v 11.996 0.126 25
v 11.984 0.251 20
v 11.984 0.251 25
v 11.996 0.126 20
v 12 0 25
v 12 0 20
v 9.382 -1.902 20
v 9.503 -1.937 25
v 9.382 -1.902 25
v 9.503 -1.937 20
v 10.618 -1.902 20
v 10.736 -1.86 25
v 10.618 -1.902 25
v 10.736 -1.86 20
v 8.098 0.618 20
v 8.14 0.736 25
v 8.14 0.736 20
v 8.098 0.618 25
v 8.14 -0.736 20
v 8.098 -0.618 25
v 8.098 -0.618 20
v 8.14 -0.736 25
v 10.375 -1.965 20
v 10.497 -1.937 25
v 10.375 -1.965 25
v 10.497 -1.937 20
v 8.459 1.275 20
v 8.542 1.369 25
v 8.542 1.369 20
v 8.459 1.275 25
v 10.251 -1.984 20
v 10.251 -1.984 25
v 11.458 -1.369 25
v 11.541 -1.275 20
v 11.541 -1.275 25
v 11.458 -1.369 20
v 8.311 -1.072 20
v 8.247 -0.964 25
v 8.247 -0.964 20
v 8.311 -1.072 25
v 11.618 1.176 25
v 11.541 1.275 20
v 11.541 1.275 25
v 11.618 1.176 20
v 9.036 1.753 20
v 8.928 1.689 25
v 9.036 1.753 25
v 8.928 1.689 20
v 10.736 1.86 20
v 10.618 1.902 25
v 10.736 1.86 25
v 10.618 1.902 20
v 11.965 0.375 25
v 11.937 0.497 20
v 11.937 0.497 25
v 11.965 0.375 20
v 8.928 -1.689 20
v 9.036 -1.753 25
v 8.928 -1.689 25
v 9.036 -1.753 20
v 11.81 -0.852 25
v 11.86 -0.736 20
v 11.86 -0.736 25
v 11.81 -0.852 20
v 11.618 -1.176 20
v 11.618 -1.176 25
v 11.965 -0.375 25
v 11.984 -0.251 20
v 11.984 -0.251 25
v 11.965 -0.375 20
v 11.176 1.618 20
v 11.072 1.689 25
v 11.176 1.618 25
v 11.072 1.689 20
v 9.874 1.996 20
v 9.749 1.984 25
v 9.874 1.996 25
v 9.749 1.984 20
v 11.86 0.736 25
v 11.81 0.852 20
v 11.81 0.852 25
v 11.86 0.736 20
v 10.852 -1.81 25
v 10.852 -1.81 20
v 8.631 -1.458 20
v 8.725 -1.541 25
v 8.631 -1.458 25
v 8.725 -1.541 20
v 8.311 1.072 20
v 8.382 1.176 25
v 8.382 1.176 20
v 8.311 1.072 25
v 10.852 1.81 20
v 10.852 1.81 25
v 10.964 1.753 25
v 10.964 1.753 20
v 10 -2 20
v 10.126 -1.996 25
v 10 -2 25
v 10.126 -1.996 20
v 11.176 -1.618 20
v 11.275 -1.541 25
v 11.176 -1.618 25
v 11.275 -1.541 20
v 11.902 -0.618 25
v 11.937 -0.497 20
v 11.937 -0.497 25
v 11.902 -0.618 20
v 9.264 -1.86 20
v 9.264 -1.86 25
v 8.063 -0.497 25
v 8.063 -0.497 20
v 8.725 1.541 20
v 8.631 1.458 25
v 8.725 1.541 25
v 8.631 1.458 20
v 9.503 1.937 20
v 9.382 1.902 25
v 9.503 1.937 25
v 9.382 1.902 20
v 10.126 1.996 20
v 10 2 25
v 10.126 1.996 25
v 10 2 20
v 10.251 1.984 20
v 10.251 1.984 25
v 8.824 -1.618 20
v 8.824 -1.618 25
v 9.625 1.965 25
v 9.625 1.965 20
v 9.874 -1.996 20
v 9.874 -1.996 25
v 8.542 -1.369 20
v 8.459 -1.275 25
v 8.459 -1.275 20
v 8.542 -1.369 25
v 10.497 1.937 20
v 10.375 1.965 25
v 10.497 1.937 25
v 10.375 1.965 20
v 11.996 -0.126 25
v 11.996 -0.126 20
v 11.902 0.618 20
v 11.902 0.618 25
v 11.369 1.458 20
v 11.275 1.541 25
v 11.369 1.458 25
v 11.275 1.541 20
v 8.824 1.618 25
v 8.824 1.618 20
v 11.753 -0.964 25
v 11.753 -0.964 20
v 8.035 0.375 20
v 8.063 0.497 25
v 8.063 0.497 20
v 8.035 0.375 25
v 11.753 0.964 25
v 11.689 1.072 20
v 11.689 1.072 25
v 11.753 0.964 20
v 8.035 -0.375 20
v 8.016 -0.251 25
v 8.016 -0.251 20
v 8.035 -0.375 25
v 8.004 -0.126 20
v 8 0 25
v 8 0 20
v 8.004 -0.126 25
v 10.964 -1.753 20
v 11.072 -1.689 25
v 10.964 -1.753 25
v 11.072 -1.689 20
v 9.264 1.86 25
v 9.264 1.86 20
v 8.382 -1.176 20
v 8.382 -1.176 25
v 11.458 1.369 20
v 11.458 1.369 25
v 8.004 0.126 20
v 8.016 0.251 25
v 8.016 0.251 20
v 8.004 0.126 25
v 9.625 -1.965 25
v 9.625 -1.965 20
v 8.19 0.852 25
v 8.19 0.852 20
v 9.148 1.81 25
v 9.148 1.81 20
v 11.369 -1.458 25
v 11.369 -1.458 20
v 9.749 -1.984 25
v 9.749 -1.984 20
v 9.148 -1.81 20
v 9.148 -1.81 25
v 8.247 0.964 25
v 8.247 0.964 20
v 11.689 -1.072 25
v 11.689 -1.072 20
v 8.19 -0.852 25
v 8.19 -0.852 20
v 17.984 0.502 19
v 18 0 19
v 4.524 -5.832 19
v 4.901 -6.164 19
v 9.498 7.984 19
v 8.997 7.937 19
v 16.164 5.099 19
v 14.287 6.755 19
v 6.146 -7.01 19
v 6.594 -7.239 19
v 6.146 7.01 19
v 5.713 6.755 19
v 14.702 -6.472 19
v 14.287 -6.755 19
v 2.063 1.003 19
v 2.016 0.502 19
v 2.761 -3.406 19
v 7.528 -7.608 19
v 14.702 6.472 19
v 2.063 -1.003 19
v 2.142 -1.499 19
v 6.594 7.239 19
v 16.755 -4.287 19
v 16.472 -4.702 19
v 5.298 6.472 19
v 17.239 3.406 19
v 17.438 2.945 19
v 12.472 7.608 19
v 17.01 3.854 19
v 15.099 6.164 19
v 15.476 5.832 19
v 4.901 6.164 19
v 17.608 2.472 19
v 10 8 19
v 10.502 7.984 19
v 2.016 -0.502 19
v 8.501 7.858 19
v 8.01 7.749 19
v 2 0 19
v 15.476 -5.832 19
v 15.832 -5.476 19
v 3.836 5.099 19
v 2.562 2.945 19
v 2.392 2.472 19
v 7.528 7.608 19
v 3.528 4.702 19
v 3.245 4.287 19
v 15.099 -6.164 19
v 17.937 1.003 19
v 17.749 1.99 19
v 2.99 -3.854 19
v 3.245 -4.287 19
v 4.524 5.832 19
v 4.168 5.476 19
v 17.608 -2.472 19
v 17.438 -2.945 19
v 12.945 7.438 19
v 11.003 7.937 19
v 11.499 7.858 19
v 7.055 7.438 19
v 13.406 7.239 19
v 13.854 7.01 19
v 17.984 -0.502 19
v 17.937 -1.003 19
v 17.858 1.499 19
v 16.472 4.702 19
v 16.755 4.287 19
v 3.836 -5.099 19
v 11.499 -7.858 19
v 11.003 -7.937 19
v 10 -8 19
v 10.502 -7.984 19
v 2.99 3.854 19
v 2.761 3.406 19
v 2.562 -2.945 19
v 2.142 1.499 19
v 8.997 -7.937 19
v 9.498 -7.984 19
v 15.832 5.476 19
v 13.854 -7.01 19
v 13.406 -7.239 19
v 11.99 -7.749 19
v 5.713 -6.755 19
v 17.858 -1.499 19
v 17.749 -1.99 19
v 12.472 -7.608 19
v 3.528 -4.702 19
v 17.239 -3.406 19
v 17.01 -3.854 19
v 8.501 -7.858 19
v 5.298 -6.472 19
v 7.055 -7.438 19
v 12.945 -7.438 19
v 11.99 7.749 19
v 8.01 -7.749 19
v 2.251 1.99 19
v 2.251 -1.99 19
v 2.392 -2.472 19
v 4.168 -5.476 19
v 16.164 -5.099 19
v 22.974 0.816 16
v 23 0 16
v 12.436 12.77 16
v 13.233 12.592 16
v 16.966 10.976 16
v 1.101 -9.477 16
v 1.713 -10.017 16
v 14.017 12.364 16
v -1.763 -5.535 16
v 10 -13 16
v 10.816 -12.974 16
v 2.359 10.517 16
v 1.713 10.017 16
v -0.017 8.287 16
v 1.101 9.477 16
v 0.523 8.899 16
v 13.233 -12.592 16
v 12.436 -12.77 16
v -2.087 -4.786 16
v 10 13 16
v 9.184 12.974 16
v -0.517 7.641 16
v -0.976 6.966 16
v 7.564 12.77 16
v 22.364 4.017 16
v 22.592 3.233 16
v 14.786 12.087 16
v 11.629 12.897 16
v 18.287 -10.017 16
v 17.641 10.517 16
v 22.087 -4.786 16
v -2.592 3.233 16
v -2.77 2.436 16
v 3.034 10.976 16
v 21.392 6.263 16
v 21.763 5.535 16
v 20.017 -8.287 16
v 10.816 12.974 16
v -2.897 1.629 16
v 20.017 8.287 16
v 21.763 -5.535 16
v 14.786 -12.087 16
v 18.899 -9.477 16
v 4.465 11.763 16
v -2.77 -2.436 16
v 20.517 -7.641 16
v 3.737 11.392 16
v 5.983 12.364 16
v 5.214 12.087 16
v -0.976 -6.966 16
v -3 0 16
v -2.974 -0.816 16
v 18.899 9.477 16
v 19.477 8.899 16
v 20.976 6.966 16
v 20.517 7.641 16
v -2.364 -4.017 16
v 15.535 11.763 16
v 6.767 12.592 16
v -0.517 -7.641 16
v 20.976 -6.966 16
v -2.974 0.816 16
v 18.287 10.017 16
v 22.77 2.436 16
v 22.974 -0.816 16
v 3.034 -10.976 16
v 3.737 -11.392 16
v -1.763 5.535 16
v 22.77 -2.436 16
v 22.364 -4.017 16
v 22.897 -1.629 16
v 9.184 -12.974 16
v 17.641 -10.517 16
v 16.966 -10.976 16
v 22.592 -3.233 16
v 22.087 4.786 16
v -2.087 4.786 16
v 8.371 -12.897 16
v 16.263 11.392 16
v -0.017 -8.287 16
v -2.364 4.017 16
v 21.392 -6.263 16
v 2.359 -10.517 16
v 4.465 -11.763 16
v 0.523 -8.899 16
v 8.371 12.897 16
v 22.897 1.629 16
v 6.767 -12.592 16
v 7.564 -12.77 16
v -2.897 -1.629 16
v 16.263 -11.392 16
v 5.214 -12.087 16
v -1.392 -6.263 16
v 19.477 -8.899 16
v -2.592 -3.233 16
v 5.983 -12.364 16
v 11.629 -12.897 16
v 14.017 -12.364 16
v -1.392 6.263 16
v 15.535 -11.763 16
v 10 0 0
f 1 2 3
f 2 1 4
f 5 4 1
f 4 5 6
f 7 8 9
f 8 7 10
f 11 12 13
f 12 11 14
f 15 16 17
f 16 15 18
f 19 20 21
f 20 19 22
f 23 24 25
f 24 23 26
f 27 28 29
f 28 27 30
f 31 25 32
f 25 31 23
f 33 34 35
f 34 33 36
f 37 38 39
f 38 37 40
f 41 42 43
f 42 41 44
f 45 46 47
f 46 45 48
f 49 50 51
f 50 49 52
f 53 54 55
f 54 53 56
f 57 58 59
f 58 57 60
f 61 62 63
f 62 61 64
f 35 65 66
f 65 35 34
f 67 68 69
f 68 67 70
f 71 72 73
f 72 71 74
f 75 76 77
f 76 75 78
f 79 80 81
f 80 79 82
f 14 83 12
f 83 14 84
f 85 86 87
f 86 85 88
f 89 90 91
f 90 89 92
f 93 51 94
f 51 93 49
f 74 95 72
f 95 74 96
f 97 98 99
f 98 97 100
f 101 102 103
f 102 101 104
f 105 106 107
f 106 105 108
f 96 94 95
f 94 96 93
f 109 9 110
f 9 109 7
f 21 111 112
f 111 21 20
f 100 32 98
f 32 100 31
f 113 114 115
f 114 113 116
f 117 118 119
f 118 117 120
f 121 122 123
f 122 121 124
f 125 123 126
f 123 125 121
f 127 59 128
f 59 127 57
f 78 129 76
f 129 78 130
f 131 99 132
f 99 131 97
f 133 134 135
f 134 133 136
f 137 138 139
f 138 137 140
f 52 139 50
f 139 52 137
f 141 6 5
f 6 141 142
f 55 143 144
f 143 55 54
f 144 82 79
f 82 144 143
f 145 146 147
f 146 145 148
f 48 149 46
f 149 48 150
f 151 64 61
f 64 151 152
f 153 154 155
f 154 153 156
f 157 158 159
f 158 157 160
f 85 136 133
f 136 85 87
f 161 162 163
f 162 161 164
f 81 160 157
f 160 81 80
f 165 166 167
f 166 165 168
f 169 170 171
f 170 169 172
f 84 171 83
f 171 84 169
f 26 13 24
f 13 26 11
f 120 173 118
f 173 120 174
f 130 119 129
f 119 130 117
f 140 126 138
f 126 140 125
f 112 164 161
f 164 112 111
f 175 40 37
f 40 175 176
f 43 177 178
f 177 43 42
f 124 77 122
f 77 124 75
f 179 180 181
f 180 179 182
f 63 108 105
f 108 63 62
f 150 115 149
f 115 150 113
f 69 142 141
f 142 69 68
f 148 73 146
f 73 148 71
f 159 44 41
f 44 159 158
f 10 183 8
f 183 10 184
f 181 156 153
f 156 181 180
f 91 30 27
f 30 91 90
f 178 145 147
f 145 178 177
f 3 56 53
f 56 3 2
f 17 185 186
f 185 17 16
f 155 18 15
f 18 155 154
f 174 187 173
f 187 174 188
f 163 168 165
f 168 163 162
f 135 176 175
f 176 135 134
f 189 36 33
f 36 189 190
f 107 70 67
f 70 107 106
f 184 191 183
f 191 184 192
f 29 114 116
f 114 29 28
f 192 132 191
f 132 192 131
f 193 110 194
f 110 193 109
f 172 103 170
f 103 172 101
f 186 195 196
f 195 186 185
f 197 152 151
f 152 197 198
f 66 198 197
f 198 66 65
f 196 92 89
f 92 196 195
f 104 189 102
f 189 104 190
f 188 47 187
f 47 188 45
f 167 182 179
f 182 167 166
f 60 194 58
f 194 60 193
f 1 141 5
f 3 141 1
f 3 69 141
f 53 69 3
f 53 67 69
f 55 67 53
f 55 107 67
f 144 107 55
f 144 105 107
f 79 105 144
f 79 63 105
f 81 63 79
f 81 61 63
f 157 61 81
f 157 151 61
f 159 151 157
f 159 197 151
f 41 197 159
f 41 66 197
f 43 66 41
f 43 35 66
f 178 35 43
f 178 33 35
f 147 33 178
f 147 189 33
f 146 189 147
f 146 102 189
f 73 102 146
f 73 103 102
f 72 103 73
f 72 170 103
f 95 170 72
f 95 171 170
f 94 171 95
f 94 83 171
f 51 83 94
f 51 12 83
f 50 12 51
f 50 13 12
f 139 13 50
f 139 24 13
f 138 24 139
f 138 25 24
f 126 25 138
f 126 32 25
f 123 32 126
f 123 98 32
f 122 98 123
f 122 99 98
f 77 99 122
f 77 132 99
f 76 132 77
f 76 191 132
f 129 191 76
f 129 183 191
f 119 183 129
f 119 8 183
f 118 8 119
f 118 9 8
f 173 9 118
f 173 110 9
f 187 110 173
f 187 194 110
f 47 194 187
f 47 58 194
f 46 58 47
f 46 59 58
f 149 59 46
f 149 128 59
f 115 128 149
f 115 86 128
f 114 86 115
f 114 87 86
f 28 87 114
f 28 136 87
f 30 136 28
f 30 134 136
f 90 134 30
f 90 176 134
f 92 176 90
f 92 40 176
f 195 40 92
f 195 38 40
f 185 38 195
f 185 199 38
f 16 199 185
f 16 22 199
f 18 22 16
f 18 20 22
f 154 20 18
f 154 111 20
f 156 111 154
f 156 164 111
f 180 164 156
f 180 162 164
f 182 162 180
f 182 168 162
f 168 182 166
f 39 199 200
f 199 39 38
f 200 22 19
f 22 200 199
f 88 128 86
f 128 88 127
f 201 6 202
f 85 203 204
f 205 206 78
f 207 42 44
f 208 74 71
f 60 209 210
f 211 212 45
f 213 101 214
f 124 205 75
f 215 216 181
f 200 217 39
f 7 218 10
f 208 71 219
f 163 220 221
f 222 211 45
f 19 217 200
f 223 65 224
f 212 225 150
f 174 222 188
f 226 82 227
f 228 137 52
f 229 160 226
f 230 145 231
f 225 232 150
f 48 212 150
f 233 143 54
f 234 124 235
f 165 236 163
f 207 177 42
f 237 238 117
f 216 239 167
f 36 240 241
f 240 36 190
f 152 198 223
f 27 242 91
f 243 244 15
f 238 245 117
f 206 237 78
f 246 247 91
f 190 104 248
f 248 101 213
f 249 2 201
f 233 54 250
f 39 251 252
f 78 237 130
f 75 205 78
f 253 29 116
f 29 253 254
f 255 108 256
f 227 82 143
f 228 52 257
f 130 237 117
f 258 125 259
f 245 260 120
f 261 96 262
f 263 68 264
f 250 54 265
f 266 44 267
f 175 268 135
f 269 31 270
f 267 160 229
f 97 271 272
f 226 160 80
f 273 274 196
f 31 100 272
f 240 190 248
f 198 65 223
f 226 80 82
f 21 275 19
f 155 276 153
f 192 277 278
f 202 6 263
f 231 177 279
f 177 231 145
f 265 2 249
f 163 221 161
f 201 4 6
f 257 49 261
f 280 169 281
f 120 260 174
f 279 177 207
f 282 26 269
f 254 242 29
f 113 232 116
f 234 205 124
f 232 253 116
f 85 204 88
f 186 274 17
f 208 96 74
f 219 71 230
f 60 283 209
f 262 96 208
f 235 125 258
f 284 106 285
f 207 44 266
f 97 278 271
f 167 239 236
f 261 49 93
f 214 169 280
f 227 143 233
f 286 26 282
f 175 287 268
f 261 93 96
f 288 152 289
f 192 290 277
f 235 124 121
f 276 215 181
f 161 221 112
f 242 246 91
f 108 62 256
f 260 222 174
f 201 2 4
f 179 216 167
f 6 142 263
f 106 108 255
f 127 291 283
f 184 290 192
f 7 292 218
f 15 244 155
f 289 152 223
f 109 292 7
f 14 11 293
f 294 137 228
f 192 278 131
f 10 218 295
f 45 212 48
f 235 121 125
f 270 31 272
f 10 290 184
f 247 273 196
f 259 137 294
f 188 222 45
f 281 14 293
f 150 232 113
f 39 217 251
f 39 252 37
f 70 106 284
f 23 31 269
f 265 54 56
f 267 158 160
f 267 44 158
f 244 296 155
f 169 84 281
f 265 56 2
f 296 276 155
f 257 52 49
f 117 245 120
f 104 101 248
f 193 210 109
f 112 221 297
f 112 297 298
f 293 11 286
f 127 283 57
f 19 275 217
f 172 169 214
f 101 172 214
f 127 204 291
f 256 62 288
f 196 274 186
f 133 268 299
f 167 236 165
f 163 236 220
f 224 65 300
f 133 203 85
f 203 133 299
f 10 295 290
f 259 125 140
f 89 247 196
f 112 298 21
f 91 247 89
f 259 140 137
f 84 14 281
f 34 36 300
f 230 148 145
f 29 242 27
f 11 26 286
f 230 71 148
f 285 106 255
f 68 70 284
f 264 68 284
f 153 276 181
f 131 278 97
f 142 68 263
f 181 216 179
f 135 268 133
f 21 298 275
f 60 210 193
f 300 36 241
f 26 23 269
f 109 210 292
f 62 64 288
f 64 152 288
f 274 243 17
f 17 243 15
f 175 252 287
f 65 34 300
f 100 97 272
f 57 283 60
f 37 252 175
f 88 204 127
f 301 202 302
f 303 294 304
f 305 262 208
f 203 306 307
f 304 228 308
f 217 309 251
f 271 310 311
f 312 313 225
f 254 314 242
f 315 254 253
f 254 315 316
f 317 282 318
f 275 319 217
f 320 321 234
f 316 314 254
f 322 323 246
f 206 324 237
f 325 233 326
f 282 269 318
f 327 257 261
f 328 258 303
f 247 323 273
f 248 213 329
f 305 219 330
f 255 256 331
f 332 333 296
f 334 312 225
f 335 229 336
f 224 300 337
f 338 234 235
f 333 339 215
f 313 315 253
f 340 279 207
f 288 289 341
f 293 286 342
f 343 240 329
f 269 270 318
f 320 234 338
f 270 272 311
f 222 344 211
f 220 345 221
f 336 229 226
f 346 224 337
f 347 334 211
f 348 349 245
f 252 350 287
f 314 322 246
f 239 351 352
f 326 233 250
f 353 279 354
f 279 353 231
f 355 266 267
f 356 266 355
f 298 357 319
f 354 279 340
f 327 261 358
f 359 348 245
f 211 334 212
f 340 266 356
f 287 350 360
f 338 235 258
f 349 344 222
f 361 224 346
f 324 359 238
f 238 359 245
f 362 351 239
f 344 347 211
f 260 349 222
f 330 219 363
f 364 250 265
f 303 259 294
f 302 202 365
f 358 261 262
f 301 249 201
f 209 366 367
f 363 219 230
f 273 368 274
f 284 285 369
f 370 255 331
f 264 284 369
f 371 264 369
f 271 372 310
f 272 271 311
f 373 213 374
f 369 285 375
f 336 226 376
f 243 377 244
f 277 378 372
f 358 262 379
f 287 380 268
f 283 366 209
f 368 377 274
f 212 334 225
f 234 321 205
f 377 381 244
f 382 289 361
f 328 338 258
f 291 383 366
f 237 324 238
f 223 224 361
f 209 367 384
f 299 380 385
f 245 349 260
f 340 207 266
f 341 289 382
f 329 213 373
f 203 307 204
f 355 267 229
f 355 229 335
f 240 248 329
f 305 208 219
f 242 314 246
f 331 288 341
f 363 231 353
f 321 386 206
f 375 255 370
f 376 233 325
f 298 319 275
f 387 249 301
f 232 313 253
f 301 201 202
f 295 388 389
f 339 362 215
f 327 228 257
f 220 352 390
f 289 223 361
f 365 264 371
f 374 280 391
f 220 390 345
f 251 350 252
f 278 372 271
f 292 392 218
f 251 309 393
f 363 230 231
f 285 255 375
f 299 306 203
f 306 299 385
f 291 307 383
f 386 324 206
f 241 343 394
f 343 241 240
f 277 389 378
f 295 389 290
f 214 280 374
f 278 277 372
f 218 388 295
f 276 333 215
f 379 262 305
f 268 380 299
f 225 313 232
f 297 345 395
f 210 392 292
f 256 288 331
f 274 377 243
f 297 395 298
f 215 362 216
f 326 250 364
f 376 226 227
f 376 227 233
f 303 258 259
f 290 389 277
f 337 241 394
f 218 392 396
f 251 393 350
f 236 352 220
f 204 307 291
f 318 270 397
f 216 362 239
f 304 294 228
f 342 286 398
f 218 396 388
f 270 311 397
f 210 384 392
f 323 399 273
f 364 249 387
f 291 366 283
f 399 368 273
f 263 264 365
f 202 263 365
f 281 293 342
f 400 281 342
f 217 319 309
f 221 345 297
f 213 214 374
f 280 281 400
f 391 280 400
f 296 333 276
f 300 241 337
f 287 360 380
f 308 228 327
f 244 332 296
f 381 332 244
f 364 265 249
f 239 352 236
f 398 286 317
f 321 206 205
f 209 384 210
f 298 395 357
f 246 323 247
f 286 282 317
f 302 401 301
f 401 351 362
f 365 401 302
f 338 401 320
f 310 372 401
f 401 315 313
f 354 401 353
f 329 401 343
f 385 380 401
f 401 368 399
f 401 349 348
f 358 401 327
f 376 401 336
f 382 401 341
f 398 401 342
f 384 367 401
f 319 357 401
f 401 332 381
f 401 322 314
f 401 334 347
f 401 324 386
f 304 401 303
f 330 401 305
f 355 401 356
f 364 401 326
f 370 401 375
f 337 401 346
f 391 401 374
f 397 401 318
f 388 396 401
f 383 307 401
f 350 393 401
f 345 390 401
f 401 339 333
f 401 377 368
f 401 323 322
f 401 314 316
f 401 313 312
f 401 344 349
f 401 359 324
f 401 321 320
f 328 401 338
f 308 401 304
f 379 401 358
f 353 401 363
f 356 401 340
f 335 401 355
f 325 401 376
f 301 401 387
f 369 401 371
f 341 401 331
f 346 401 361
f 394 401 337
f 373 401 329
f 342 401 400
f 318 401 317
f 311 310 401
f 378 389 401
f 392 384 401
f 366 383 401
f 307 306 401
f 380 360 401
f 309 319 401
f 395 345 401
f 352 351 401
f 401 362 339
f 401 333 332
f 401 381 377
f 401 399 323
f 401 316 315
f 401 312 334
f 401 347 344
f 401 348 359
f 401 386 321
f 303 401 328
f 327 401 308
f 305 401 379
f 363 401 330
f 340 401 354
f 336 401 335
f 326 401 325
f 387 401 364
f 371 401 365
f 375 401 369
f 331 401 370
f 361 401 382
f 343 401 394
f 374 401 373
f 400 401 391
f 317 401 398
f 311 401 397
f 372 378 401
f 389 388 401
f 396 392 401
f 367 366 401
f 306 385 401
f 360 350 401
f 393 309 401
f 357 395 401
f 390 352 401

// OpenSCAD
$fn = 100;
r=3;
h=5;
module spinner(r=3, h=5){
union(){
        translate([0,0,20])cylinder(h=h,r1=r-1,r2=r-1);
        translate([0,0,24-h])cylinder(h=h-4,r1=r+5,r2=r-1);
        translate([0,0,26-2*h])cylinder(h=h-2,r1=r+10,r2=r+5);
        cylinder(h=16,r1=0,r2=r+10);
        }
}
translate([10,0,0])spinner();
